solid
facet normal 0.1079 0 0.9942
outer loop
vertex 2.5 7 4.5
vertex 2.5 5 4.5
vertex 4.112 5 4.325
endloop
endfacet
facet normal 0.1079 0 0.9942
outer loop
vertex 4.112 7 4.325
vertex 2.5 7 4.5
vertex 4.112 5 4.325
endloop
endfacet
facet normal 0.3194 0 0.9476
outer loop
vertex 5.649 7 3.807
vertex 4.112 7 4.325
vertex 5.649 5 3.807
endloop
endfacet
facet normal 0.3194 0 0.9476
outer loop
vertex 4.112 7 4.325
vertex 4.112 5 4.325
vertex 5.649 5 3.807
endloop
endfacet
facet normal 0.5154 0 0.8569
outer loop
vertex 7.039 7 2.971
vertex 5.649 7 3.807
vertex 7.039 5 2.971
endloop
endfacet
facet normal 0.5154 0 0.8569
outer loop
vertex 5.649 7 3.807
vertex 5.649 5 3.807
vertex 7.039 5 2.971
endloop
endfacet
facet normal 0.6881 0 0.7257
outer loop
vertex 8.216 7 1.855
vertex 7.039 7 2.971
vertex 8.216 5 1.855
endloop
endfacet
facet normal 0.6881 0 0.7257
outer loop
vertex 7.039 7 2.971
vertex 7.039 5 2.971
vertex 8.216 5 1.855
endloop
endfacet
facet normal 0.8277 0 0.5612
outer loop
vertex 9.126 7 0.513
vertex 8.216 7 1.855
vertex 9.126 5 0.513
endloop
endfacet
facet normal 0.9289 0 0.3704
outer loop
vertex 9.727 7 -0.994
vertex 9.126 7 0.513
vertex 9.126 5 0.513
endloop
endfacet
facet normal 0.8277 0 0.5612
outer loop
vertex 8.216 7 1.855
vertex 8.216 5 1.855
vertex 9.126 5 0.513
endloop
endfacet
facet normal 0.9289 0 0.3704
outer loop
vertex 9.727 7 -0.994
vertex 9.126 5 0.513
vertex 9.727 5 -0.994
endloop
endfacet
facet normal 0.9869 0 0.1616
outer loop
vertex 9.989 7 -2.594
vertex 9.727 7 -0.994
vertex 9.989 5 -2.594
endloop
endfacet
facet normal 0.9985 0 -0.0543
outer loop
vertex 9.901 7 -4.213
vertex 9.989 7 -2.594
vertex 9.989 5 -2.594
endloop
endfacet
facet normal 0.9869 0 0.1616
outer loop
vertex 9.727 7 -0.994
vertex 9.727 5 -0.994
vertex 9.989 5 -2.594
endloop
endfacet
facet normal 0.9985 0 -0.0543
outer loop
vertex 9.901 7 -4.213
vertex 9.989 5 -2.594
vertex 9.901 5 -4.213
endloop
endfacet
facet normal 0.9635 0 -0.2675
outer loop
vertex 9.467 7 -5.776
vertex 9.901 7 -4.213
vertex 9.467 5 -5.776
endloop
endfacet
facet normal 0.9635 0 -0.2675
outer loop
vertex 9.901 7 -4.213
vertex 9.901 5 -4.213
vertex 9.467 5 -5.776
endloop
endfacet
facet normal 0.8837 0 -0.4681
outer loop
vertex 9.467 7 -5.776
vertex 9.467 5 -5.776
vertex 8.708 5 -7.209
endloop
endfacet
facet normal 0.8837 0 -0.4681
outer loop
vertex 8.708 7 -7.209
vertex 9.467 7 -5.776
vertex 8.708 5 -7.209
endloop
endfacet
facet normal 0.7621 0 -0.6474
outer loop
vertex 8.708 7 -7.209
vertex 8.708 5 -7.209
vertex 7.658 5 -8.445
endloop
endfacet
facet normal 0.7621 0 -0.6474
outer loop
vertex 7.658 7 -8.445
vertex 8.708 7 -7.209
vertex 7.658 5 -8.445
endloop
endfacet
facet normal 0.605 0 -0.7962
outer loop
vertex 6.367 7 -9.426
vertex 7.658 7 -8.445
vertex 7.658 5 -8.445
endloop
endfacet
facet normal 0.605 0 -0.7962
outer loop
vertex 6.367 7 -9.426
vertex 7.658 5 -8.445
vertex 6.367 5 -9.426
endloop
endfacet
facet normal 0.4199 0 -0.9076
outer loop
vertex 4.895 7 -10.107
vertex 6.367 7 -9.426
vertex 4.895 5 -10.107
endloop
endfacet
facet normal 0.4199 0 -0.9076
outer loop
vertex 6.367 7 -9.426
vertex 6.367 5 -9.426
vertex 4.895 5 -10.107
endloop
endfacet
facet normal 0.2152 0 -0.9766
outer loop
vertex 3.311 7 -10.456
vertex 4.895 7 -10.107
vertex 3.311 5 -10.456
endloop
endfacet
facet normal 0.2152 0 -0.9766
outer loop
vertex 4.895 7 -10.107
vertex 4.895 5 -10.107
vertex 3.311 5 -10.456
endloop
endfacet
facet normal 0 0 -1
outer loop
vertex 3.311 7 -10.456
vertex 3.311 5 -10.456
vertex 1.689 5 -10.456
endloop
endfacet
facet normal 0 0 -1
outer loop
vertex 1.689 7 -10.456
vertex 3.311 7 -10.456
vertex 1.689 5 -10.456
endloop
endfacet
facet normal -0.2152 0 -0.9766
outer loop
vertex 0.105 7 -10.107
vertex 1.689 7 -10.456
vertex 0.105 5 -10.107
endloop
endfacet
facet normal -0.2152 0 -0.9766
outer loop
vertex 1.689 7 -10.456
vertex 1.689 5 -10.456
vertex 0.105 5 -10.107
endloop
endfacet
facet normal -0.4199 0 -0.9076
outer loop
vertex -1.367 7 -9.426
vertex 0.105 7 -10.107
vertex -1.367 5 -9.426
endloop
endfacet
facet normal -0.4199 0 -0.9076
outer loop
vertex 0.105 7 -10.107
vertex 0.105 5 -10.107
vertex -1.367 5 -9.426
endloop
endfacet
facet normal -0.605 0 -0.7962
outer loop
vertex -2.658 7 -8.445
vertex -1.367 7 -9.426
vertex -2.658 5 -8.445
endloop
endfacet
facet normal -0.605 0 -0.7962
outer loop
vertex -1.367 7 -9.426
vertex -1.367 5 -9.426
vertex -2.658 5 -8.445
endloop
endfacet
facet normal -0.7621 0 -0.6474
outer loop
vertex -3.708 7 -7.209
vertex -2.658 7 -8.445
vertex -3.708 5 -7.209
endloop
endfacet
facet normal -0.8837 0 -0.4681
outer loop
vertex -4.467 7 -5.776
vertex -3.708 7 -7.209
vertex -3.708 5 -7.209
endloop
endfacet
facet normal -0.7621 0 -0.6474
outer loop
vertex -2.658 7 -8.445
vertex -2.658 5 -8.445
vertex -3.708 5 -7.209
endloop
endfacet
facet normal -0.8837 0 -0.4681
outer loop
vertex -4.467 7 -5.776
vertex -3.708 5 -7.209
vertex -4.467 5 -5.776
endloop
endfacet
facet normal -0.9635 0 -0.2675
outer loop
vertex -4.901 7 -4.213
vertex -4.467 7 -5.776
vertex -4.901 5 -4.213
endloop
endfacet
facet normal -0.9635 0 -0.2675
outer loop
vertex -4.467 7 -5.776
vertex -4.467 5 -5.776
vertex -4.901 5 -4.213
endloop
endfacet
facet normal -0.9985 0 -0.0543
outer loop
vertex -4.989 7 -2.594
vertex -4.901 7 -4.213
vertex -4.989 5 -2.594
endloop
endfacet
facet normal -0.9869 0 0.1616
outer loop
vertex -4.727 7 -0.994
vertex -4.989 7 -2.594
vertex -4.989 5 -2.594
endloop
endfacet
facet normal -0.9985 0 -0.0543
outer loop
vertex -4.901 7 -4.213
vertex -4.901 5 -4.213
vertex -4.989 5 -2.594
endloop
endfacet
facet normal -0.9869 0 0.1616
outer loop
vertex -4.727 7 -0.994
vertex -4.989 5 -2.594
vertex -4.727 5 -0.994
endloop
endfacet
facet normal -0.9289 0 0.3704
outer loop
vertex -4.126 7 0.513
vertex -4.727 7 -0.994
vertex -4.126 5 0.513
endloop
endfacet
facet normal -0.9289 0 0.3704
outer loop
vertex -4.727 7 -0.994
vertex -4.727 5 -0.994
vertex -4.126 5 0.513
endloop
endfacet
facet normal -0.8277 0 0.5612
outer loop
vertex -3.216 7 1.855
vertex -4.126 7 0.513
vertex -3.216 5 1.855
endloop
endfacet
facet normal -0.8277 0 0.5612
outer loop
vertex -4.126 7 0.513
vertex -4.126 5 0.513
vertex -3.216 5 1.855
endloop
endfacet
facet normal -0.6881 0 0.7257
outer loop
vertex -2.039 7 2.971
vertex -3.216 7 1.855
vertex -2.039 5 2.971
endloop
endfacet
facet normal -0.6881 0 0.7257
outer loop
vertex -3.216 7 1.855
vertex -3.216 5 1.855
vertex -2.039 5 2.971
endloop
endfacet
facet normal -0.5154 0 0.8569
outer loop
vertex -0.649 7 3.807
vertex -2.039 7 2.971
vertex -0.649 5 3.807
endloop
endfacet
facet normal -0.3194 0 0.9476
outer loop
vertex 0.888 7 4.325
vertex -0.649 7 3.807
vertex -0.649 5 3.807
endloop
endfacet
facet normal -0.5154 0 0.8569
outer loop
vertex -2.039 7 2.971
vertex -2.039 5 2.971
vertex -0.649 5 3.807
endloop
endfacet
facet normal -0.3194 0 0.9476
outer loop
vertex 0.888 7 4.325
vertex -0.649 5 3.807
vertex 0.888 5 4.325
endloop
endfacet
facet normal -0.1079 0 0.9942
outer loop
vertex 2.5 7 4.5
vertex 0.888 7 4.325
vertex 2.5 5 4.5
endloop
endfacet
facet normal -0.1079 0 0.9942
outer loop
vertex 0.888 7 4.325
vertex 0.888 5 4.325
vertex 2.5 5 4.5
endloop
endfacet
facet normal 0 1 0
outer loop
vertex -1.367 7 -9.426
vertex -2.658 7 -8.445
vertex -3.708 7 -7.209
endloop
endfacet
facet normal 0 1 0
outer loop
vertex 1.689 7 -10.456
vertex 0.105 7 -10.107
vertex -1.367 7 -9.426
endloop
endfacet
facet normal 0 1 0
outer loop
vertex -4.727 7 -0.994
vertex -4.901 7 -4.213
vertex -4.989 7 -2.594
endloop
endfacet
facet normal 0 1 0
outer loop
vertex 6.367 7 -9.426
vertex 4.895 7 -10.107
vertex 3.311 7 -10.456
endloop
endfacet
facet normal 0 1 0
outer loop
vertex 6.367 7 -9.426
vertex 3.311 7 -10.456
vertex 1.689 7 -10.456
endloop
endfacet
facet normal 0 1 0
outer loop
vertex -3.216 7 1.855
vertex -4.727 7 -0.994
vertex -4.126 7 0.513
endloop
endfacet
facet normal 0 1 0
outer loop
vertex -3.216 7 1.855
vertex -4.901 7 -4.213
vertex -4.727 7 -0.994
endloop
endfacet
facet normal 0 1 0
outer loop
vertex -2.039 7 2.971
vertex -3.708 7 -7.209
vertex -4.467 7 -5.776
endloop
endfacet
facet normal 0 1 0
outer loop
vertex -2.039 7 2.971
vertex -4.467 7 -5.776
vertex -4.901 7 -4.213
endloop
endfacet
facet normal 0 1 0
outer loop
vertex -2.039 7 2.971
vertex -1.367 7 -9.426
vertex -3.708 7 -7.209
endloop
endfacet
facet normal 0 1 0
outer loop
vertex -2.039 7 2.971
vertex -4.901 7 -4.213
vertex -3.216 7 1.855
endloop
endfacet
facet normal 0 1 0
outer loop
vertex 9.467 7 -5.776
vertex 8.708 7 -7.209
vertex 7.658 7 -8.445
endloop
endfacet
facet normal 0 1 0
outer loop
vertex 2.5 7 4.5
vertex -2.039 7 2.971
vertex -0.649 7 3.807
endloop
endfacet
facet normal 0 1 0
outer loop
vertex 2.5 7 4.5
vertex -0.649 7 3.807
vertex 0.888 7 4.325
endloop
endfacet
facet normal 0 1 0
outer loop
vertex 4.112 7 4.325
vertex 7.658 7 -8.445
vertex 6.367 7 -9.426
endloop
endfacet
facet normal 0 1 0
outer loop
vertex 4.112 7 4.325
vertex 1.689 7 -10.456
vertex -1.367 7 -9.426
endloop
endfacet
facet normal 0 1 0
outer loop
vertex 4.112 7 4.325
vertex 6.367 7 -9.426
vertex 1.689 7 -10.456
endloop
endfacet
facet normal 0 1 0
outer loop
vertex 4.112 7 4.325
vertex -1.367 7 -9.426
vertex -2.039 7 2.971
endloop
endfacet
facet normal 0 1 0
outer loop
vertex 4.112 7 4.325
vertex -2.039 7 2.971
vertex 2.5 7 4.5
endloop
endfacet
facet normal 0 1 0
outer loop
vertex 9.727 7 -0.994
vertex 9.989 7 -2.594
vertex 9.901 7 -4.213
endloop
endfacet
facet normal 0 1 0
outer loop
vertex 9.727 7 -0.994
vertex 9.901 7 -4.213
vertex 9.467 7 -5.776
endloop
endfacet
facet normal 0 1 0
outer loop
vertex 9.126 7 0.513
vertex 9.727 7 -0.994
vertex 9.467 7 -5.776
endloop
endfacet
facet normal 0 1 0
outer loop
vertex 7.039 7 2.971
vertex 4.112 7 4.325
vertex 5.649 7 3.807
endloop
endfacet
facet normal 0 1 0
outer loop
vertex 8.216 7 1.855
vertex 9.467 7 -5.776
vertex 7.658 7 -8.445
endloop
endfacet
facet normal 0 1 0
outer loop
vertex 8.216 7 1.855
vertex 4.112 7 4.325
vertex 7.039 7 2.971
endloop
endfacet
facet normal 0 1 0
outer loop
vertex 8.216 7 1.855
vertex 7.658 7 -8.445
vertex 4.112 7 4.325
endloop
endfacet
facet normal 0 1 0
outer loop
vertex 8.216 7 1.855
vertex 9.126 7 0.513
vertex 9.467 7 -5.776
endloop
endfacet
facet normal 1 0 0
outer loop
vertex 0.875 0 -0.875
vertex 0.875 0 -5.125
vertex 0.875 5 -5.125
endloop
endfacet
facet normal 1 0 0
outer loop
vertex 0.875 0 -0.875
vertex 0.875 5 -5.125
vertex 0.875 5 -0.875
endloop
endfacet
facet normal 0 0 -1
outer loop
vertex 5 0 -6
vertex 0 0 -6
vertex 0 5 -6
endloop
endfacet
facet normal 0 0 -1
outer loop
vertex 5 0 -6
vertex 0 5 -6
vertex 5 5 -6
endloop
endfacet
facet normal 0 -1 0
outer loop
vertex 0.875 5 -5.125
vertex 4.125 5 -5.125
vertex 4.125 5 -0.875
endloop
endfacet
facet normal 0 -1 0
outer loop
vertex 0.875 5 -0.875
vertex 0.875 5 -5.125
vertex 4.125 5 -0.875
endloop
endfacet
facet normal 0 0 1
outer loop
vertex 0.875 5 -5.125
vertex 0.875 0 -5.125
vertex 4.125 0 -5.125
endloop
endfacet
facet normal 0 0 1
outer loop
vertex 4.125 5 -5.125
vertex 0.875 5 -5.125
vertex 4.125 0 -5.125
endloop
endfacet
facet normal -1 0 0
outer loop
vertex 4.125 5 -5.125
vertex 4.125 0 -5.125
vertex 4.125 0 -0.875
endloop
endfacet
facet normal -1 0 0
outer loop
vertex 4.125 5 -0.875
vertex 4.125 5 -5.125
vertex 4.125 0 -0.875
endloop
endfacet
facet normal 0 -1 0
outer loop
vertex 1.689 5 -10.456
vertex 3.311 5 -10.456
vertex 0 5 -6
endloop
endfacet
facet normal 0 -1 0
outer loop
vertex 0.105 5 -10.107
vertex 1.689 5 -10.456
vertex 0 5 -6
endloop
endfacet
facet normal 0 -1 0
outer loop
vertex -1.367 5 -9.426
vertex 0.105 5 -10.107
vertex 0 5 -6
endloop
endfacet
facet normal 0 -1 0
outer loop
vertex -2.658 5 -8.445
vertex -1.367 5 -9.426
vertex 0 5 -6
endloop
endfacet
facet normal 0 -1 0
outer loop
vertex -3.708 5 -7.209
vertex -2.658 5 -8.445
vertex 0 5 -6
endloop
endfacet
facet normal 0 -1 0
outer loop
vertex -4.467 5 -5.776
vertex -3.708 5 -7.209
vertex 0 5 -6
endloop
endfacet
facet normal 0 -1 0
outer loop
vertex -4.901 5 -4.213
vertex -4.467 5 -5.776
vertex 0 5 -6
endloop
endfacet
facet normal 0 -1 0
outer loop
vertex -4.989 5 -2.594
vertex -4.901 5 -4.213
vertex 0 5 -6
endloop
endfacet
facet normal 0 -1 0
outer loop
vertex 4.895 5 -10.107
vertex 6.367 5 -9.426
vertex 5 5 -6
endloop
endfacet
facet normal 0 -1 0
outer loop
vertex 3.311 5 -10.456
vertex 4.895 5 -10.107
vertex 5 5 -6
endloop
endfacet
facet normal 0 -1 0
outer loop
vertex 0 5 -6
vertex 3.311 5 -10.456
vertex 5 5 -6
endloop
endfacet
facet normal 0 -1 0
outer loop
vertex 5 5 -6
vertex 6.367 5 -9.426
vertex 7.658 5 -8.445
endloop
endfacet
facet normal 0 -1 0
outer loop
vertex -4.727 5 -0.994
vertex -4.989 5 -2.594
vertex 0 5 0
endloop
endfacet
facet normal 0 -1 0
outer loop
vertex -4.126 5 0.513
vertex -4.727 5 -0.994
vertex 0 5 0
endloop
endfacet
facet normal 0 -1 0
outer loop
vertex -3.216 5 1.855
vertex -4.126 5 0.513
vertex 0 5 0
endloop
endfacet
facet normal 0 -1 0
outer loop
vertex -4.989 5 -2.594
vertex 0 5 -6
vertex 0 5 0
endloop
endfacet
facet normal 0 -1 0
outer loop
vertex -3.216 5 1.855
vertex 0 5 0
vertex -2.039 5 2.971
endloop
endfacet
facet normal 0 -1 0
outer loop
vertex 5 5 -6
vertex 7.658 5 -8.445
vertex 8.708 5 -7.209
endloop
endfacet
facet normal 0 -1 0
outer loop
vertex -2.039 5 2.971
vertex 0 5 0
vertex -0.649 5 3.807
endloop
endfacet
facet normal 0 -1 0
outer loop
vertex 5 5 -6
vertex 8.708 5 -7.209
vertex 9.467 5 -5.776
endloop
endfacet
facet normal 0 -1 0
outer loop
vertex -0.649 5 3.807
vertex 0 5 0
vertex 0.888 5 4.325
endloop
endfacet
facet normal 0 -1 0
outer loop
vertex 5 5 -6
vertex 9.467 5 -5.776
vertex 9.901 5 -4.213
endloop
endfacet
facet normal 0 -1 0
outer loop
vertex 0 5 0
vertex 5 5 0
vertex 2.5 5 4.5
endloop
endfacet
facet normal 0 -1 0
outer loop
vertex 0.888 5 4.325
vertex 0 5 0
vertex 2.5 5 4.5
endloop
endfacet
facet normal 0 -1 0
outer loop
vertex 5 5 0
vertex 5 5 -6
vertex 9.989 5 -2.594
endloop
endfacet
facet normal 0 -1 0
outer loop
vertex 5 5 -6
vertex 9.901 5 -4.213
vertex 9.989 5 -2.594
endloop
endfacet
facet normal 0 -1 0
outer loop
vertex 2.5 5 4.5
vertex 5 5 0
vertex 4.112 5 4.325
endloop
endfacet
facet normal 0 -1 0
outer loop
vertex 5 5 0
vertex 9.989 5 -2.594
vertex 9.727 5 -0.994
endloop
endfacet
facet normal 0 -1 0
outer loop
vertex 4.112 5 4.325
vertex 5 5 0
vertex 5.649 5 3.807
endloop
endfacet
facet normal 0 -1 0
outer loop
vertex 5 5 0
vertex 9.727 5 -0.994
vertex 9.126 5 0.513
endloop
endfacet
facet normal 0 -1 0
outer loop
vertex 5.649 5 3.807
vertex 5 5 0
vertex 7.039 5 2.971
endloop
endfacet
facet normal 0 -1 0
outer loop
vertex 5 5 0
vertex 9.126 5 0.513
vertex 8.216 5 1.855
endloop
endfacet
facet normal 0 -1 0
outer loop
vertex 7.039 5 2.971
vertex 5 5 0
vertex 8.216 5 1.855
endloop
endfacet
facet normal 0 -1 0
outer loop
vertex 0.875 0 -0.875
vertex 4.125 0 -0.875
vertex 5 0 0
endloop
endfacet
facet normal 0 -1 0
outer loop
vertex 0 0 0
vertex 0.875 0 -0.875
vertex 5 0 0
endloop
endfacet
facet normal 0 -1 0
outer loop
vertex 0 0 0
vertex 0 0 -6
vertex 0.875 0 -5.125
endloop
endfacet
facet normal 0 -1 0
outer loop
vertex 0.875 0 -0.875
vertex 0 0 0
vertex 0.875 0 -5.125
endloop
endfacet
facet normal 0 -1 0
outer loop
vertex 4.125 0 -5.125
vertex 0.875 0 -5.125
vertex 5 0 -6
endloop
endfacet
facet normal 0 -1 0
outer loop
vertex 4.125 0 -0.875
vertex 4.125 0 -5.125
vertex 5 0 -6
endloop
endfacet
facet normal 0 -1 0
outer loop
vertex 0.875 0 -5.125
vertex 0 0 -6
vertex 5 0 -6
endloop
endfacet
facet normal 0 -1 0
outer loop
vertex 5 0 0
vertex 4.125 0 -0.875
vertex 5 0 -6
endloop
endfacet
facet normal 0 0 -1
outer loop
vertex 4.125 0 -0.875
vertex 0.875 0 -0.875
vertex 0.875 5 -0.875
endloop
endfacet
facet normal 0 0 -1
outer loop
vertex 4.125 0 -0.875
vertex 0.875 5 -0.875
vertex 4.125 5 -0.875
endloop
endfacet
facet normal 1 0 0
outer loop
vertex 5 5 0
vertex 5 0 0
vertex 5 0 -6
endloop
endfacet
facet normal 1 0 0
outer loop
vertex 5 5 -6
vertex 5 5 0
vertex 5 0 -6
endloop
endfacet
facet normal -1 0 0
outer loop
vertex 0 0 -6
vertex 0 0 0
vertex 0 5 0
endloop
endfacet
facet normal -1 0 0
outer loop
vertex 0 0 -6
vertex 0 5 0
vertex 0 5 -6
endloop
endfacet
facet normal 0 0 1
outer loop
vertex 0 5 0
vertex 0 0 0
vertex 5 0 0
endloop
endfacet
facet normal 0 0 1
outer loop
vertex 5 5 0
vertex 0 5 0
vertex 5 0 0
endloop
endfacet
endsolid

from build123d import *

# Parameters (mm, degrees)
SKETCH1_W           = 5
SKETCH1_H           = 6
BOSS_EXTRUDE1_DEPTH = 5
SKETCH2_W           = 3.25
SKETCH2_H           = 4.25
CUT_EXTRUDE1_DEPTH  = 5
SKETCH3_R           = 7.5
BOSS_EXTRUDE2_DEPTH = 2


with BuildPart() as part:
    # Sketch1 → Boss-Extrude1 (new body)
    with BuildSketch(Plane(origin=(0, 0, 0), x_dir=(1, 0, 0), z_dir=(0, 1, 0))):
        with Locations((2.5, 3)):
            Rectangle(SKETCH1_W, SKETCH1_H)
    extrude(amount=BOSS_EXTRUDE1_DEPTH)

    # Sketch2 → Cut-Extrude1 (cut)
    with BuildSketch(Plane.XZ):
        with Locations((2.5, -3)):
            Rectangle(SKETCH2_W, SKETCH2_H)
    extrude(amount=-CUT_EXTRUDE1_DEPTH, mode=Mode.SUBTRACT)

    # Sketch3 → Boss-Extrude2 (add)
    with BuildSketch(Plane(origin=(0, 5, 0), x_dir=(1, 0, 0), z_dir=(0, 1, 0))):
        with Locations(Location((2.5, 3, 0), (0, 0, 270))):
            Circle(SKETCH3_R)
    extrude(amount=BOSS_EXTRUDE2_DEPTH)


solid = part.part
